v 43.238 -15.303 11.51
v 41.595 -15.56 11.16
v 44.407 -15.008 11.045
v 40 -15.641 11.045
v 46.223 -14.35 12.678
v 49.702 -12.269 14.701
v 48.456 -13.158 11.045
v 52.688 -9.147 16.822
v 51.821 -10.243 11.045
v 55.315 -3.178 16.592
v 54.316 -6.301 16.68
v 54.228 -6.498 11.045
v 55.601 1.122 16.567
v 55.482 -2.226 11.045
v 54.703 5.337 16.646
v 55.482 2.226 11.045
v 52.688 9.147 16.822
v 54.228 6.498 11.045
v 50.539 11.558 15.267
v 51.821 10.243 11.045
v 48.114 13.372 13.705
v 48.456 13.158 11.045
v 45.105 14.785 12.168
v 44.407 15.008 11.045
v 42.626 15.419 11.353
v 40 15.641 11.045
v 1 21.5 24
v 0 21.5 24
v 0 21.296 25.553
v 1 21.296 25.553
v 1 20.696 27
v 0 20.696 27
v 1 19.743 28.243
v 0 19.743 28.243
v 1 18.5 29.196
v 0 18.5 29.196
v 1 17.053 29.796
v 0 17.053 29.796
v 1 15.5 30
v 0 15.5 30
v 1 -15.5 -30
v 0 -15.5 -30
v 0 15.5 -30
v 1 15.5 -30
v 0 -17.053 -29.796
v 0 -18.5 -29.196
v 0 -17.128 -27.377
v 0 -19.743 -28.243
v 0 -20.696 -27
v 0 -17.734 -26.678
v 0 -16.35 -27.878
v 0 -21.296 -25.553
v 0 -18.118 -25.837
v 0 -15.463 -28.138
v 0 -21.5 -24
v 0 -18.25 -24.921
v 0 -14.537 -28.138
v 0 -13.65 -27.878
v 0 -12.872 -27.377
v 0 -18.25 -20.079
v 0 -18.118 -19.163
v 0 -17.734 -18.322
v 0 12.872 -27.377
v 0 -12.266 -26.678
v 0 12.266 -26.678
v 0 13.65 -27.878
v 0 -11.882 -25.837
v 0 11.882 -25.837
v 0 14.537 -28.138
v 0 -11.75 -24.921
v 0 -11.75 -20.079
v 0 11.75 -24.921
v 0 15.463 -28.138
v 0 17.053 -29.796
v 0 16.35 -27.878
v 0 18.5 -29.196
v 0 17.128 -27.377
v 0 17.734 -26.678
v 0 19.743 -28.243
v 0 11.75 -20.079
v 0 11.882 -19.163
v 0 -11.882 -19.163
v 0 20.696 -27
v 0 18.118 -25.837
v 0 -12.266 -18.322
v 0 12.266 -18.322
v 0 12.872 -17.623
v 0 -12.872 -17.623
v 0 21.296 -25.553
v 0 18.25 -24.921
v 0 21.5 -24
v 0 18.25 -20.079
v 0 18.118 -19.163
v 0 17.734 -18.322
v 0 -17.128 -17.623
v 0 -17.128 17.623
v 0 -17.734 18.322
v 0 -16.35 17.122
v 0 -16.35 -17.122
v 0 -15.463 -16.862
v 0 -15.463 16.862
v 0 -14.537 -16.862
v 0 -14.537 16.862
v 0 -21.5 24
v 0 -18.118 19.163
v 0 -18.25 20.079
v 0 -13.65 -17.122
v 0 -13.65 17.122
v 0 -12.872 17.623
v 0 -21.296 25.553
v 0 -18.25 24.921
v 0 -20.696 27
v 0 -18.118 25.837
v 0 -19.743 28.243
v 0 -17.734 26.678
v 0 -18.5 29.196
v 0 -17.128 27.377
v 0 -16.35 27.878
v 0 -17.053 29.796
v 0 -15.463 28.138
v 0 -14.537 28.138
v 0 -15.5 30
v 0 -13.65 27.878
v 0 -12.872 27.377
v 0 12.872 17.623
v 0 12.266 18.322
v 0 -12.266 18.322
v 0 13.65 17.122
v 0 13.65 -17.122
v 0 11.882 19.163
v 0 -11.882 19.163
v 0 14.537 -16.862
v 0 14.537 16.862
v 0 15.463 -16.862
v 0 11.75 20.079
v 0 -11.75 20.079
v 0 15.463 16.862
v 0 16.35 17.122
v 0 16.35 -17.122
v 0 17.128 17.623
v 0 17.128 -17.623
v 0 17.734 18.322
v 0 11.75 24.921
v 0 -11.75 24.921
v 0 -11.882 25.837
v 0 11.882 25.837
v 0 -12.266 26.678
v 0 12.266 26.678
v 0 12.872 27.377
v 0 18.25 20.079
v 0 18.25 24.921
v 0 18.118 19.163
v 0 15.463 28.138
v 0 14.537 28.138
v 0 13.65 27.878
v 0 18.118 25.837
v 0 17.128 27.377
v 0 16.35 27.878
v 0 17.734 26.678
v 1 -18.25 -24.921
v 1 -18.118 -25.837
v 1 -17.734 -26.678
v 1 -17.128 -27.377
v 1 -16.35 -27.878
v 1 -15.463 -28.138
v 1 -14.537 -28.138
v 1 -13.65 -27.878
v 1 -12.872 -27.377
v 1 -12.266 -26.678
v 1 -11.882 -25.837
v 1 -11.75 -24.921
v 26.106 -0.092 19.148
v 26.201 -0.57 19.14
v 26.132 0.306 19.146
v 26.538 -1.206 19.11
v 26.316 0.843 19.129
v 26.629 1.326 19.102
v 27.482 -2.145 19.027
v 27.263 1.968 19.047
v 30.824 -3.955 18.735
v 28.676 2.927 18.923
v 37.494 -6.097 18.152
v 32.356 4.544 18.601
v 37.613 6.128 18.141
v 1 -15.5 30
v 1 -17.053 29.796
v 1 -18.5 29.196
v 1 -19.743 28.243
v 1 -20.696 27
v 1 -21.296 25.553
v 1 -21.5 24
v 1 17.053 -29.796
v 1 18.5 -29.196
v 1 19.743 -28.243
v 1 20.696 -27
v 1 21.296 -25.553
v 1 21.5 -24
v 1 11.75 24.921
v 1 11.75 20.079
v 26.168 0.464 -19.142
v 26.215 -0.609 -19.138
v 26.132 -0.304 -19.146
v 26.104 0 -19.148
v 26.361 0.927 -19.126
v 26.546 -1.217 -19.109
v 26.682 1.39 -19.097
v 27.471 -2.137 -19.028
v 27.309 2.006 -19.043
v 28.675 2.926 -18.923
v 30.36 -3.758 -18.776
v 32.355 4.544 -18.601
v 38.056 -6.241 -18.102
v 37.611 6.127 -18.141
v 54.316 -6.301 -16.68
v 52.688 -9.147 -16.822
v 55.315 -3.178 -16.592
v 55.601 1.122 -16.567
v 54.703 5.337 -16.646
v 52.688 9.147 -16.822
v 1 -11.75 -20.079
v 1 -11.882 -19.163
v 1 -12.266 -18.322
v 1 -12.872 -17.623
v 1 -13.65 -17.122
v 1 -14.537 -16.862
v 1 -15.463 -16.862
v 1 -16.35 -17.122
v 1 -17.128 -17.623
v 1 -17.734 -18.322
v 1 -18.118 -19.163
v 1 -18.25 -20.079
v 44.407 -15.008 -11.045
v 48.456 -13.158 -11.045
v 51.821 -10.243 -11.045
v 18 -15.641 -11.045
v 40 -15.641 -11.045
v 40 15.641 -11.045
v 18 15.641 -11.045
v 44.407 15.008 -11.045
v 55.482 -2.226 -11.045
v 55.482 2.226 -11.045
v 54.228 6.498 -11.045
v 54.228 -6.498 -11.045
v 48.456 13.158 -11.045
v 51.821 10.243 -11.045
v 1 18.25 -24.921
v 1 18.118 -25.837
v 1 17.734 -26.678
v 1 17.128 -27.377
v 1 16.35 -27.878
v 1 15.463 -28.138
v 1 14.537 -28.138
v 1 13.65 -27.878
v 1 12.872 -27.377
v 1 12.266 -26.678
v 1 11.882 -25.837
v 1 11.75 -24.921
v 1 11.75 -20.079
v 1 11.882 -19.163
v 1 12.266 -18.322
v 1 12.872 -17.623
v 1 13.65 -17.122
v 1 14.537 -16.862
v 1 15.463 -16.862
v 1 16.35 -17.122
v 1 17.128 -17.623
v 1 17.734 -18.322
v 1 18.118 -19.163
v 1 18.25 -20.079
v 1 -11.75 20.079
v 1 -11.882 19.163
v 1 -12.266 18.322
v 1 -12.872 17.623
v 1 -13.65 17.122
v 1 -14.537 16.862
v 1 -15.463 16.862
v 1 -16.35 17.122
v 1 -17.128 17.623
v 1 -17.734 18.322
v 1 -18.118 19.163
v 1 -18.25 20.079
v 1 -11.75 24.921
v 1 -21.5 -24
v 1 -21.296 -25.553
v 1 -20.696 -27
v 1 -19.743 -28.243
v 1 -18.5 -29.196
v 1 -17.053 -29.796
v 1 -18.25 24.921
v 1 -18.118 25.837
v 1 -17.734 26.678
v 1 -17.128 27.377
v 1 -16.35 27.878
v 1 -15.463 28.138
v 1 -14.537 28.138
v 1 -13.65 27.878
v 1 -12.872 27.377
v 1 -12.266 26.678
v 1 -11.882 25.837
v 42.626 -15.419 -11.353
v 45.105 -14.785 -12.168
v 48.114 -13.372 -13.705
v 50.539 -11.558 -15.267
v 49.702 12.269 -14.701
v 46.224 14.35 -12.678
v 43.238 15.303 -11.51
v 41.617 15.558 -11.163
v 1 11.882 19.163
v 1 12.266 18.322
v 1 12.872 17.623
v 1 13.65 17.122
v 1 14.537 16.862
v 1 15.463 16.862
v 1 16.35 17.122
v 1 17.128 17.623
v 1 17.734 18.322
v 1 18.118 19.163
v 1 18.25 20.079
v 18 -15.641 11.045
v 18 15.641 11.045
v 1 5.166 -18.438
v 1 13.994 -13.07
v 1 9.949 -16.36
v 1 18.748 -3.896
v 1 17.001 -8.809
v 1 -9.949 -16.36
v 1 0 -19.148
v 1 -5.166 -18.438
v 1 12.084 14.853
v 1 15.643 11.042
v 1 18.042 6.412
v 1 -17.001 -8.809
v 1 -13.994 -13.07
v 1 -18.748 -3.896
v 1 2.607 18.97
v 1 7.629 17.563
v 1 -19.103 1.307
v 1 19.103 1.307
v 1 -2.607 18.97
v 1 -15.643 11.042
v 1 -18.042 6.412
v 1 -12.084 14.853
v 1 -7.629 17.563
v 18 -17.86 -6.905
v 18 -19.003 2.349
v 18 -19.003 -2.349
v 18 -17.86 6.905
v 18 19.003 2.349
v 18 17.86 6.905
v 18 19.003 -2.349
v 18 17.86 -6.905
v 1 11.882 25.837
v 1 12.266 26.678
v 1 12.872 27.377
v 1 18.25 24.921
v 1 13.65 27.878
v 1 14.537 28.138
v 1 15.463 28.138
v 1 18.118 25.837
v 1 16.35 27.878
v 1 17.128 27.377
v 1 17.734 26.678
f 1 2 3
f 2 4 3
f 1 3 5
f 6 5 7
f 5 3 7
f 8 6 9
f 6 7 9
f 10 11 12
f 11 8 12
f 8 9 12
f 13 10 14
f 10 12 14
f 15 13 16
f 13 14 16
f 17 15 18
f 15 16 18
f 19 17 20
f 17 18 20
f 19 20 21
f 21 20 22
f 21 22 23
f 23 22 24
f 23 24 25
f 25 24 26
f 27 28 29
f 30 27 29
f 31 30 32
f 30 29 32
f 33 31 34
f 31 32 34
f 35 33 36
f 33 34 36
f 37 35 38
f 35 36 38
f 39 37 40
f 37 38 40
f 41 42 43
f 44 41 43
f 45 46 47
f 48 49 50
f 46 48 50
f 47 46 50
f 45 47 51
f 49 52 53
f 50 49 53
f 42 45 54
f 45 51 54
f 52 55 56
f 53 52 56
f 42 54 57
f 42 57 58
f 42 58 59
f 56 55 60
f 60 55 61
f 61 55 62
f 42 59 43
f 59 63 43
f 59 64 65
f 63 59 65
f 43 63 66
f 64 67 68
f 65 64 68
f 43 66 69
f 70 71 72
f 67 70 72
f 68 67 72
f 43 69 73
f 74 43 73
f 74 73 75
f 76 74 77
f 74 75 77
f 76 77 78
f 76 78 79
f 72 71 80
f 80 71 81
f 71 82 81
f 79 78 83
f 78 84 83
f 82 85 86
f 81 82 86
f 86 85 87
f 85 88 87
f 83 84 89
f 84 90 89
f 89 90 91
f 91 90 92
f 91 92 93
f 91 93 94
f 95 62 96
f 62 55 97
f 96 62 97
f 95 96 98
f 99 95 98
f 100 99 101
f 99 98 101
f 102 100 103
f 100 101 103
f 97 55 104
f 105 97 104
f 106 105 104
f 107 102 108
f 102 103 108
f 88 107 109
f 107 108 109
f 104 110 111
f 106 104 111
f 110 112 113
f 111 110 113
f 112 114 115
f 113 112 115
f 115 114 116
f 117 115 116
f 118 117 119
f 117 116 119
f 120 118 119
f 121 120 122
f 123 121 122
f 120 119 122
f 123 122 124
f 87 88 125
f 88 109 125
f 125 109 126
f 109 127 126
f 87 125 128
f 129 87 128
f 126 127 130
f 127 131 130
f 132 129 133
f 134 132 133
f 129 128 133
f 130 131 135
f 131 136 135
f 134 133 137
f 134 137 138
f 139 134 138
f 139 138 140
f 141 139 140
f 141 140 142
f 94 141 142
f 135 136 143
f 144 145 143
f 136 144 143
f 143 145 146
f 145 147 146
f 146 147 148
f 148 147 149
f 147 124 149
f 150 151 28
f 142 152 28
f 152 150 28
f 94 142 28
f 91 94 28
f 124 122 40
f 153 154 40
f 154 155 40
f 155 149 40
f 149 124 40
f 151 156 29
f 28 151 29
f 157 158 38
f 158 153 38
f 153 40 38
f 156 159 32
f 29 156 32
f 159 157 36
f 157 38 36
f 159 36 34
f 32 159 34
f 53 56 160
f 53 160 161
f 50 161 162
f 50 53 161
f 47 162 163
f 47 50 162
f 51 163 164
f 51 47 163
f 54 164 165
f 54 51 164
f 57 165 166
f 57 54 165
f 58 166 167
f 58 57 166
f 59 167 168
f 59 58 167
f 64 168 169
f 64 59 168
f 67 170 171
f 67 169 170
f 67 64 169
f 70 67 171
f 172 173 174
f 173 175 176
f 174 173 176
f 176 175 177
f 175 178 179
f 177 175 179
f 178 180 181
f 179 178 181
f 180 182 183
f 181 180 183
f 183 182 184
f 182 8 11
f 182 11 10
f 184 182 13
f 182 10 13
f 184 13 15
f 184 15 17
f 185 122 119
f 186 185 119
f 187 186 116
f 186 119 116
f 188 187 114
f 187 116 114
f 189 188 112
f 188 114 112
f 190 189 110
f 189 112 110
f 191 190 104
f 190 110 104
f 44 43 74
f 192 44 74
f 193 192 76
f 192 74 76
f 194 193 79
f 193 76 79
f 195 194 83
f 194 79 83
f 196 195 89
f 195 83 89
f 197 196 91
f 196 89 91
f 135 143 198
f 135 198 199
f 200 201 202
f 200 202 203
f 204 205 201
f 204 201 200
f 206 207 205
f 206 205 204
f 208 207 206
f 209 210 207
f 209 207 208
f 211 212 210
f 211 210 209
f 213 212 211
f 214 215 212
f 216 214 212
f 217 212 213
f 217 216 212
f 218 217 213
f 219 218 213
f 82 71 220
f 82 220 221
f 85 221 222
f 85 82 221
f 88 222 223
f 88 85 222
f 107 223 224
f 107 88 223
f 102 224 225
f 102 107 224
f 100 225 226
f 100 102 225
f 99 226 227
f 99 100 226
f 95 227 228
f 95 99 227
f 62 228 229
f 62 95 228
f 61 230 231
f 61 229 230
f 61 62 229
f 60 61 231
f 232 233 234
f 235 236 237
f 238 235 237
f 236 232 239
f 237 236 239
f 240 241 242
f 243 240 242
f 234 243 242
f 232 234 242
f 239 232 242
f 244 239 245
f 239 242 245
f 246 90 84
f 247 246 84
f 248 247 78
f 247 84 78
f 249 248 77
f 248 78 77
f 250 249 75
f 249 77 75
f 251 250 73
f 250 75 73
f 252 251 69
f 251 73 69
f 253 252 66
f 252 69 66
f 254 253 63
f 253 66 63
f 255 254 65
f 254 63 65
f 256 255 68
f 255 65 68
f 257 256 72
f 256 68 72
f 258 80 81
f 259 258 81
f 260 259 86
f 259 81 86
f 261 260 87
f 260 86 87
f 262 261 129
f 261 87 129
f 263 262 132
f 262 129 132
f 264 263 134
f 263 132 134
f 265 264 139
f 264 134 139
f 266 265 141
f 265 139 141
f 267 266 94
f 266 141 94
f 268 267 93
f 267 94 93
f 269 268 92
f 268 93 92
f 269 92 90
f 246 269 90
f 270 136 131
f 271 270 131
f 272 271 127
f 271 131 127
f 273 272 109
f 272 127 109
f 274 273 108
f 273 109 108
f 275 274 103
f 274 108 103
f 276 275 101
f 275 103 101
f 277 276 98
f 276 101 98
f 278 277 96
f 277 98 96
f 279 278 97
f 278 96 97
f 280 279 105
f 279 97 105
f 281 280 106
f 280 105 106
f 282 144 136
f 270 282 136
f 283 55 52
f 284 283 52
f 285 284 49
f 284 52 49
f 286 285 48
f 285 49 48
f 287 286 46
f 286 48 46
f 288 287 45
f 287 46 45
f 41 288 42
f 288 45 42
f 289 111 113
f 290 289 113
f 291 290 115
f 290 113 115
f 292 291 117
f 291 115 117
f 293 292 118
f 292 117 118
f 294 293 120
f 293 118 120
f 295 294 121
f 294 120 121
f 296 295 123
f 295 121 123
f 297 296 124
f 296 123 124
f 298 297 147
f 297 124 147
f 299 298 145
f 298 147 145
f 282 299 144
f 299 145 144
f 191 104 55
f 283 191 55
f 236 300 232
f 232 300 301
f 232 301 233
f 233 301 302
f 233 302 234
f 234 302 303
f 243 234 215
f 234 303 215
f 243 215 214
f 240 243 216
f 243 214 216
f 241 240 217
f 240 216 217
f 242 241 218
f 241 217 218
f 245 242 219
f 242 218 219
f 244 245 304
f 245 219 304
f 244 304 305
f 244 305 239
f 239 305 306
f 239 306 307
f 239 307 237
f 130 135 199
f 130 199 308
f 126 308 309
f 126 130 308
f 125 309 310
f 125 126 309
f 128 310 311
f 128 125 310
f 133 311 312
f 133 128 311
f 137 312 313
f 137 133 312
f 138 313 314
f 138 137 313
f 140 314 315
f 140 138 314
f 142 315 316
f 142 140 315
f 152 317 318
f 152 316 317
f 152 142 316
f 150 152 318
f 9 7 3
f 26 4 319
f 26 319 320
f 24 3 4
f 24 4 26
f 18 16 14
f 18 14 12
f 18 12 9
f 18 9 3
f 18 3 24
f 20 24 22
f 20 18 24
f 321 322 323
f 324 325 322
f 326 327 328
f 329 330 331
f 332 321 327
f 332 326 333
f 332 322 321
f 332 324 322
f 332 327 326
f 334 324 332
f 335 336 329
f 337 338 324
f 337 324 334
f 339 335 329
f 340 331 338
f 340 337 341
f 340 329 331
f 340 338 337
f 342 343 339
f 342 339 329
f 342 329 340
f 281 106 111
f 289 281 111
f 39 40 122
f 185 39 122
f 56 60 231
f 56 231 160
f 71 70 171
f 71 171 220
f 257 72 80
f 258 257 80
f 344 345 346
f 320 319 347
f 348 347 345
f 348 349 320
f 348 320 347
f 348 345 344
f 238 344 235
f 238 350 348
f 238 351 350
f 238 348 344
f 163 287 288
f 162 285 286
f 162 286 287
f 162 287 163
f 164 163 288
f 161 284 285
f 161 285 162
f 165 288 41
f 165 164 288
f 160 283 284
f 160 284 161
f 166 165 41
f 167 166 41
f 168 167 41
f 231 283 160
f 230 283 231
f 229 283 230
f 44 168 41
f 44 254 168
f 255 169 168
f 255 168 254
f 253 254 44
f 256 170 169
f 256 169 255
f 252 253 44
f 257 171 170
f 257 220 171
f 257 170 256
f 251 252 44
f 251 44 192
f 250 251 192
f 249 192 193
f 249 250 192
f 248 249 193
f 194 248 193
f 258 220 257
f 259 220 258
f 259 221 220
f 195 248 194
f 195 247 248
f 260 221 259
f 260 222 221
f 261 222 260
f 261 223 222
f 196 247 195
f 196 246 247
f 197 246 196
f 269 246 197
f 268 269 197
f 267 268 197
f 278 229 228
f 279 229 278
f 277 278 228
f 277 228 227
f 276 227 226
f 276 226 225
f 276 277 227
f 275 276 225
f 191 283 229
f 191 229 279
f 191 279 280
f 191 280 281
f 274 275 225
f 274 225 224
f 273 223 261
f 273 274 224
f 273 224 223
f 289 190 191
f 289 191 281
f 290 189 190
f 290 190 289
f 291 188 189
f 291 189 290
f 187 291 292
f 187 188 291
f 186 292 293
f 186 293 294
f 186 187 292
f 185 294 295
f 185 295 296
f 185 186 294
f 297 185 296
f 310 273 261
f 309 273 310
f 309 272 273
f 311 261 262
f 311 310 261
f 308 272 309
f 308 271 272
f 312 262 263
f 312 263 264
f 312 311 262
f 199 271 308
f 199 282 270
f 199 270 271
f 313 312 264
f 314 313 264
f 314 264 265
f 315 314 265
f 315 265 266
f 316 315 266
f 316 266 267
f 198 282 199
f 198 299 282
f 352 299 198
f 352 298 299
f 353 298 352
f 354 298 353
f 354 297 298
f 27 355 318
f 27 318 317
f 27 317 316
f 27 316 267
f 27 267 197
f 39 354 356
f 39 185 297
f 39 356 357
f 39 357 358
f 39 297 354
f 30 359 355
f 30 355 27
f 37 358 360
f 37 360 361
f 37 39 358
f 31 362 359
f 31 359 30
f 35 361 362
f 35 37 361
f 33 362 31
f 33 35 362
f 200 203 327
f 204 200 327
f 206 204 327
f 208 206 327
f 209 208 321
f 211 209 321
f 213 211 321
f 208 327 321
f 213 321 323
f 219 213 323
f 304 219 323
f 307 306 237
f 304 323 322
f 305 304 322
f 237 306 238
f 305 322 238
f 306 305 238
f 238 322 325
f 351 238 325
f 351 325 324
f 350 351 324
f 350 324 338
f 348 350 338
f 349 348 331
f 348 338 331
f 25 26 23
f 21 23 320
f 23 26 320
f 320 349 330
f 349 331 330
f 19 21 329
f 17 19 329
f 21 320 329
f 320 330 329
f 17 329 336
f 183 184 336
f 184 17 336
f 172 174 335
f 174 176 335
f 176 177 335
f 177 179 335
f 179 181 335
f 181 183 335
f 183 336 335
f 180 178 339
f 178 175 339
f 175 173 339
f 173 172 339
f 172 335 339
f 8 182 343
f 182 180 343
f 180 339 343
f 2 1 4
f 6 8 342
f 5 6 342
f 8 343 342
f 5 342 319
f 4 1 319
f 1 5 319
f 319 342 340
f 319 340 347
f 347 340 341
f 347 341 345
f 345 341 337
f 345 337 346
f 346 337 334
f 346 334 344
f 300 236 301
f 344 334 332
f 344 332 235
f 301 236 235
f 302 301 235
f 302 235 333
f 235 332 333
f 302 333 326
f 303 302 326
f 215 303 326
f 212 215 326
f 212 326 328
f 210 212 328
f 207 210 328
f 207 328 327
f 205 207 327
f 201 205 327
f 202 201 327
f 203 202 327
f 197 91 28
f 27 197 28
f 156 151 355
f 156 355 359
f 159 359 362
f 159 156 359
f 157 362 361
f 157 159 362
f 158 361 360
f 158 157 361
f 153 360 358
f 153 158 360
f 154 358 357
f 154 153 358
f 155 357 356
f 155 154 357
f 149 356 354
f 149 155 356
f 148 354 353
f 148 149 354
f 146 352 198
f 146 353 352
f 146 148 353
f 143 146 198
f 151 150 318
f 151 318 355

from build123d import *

# Parameters (mm, degrees)
SKETCH_1_R                     = 1.5
EXTRUDE_1_DEPTH                = 1
SKETCH_2_R                     = 19.148010015
EXTRUDE_2_DEPTH                = 59
SKETCH_3_W                     = 18.03673264
SKETCH_3_H                     = 38.517695405
CUT_EXTRUDE_1_DEPTH            = 56
CUT_EXTRUDE_1_DRAFT            = -5
CUT_EXTRUDE_1_PROFILE_2_DEPTH  = 56
CUT_EXTRUDE_1_PROFILE_2_DRAFT  = -5
SKETCH_4_R                     = 20
EXTRUDE_3_DEPTH                = 10
SKETCH_5_W                     = 22.090311304
SKETCH_5_H                     = 43.24098638
CUT_EXTRUDE_2_DEPTH            = 42
CUT_EXTRUDE_3_DEPTH            = 71.443239562
CUT_EXTRUDE_3_DEPTH_BACK       = 71.443239562
SPLIT_BODIES_1_SURFACE_1_BACK  = 96.126
SPLIT_BODIES_1_SURFACE_1_DEPTH = 192.252
SPLIT_BODIES_1_SURFACE_2_BACK  = 96.126
SPLIT_BODIES_1_SURFACE_2_DEPTH = 192.252
MOVE_BODY_1_ANGLE              = 90
CUT_EXTRUDE_4_DEPTH            = 10


with BuildPart() as part:
    # 草图1 → 凸台-拉伸1 (new body)
    with BuildSketch(Plane(origin=(0, 0, 0), x_dir=(0, 0, -1), z_dir=(1, 0, 0))):
        with BuildLine():
            Line((-15.5, -30), (15.5, -30))
            ThreePointArc((15.5, -30), (19.742640687, -28.242640687), (21.5, -24))
            Line((21.5, -24), (21.5, 24))
            ThreePointArc((21.5, 24), (19.742640687, 28.242640687), (15.5, 30))
            Line((15.5, 30), (-15.5, 30))
            ThreePointArc((-15.5, 30), (-19.742640687, 28.242640687), (-21.5, 24))
            Line((-21.5, 24), (-21.5, -24))
            ThreePointArc((-21.5, -24), (-19.742640687, -28.242640687), (-15.5, -30))
        make_face()
        with Locations((15, 22.5)):
            Circle(SKETCH_1_R, mode=Mode.SUBTRACT)
        with Locations(Location((-15, 22.5, 0), (0, 0, 180))):
            Circle(SKETCH_1_R, mode=Mode.SUBTRACT)
        with Locations(Location((15, -22.5, 0), (0, 0, 180))):
            Circle(SKETCH_1_R, mode=Mode.SUBTRACT)
        with Locations((-15, -22.5)):
            Circle(SKETCH_1_R, mode=Mode.SUBTRACT)
    extrude(amount=EXTRUDE_1_DEPTH)

    # 草图2 → 凸台-拉伸2 (add)
    with BuildSketch(Plane(origin=(1, 0, 0), x_dir=(0, 0, -1), z_dir=(1, 0, 0))):
        Circle(SKETCH_2_R)
    extrude(amount=EXTRUDE_2_DEPTH)


with BuildPart() as cut_extrude_1_tool:
    # 草图3 → 切除-拉伸1 (with draft: the straight prism first)
    with BuildSketch(Plane(origin=(60, 0, 0), x_dir=(0, 0, -1), z_dir=(1, 0, 0))):
        with Locations((-25.200855418, 1.306398859)):
            Rectangle(SKETCH_3_W, SKETCH_3_H)
    extrude(amount=-CUT_EXTRUDE_1_DEPTH)
    # 切除-拉伸1: the draft: its side faces are tilted about the plane it starts from
    cut_extrude_1_sides = [cut_extrude_1_tool.faces().sort_by_distance(p)[0] for p in [
        (32, 1.306398859, 34.219221738),
        (32, -17.952448843, 25.200855418),
        (32, 1.306398859, 16.182489098),
        (32, 20.565246562, 25.200855418),
    ]]
    draft(cut_extrude_1_sides, Plane(origin=(60, 0, 0), x_dir=(0, 0, -1), z_dir=(1, 0, 0)), CUT_EXTRUDE_1_DRAFT)


with BuildPart() as part_1:
    add(part.part)

    # 切除-拉伸1: cut by cut_extrude_1_tool
    add(cut_extrude_1_tool.part, mode=Mode.SUBTRACT)


with BuildPart() as cut_extrude_1_profile_2_tool:
    # 草图3 → 切除-拉伸1 profile 2 (with draft: the straight prism first)
    with BuildSketch(Plane(origin=(60, 0, 0), x_dir=(0, 0, -1), z_dir=(1, 0, 0))):
        with Locations((25.200855418, 1.306398859)):
            Rectangle(SKETCH_3_W, SKETCH_3_H)
    extrude(amount=-CUT_EXTRUDE_1_PROFILE_2_DEPTH)
    # 切除-拉伸1 profile 2: the draft: its side faces are tilted about the plane it starts from
    cut_extrude_1_profile_2_sides = [cut_extrude_1_profile_2_tool.faces().sort_by_distance(p)[0] for p in [
        (32, 1.306398859, -16.182489098),
        (32, -17.952448843, -25.200855418),
        (32, 1.306398859, -34.219221738),
        (32, 20.565246562, -25.200855418),
    ]]
    draft(cut_extrude_1_profile_2_sides, Plane(origin=(60, 0, 0), x_dir=(0, 0, -1), z_dir=(1, 0, 0)), CUT_EXTRUDE_1_PROFILE_2_DRAFT)


with BuildPart() as part_2:
    add(part_1.part)

    # 切除-拉伸1 profile 2: cut by cut_extrude_1_profile_2_tool
    add(cut_extrude_1_profile_2_tool.part, mode=Mode.SUBTRACT)

    # 草图5 → 切除-拉伸2 (cut)
    with BuildSketch(Plane(origin=(60, 0, 0), x_dir=(0, 0, -1), z_dir=(1, 0, 0))):
        Rectangle(SKETCH_5_W, SKETCH_5_H)
    extrude(amount=-CUT_EXTRUDE_2_DEPTH, mode=Mode.SUBTRACT)

    # 草图6 → 切除-拉伸3 (cut, two sides: drawn at the far end of the back side and taken through both)
    with BuildSketch(Plane.XY.offset(-CUT_EXTRUDE_3_DEPTH_BACK)):
        with BuildLine():
            Line((40, 15.641317852), (60, 15.641317852))
            Line((60, 15.641317852), (60, -15.641317852))
            Line((60, -15.641317852), (40, -15.641317852))
            ThreePointArc((40, -15.641317852), (55.641317852, 0), (40, 15.641317852))
        make_face()
    extrude(amount=CUT_EXTRUDE_3_DEPTH + CUT_EXTRUDE_3_DEPTH_BACK, mode=Mode.SUBTRACT)


with BuildPart() as body_2:
    # 草图4 → 凸台-拉伸3 (new, symmetric)
    with BuildSketch(Plane.XY):
        with Locations((40, 0)):
            Circle(SKETCH_4_R)
    extrude(amount=EXTRUDE_3_DEPTH, both=True)


with BuildPart() as body_3:
    # Split Bodies 1: the piece behind the surface
    add(part_2.part)
    # Split Bodies 1 surface: a surface, the sketch's curves swept straight by 192.252 mm
    with BuildLine(Plane(origin=(0, 0, -21.5), x_dir=(-1, 0, 0), z_dir=(0, 0, -1)).offset(-SPLIT_BODIES_1_SURFACE_1_BACK), mode=Mode.PRIVATE) as split_bodies_1_surface_1_path:
        Line((-1, 32.867320156), (-1, -33.990989222))
    split_bodies_1_surface_1 = Shell.extrude(split_bodies_1_surface_1_path.wire(), (0 * SPLIT_BODIES_1_SURFACE_1_DEPTH, 0 * SPLIT_BODIES_1_SURFACE_1_DEPTH, -1 * SPLIT_BODIES_1_SURFACE_1_DEPTH))
    split(bisect_by=split_bodies_1_surface_1, keep=Keep.BOTTOM)


with BuildPart() as part_3:
    add(part_2.part)

    # Split Bodies 1: split by a surface, the side it looks to stays
    # Split Bodies 1 surface: a surface, the sketch's curves swept straight by 192.252 mm
    with BuildLine(Plane(origin=(0, 0, -21.5), x_dir=(-1, 0, 0), z_dir=(0, 0, -1)).offset(-SPLIT_BODIES_1_SURFACE_2_BACK), mode=Mode.PRIVATE) as split_bodies_1_surface_2_path:
        Line((-1, 32.867320156), (-1, -33.990989222))
    split_bodies_1_surface_2 = Shell.extrude(split_bodies_1_surface_2_path.wire(), (0 * SPLIT_BODIES_1_SURFACE_2_DEPTH, 0 * SPLIT_BODIES_1_SURFACE_2_DEPTH, -1 * SPLIT_BODIES_1_SURFACE_2_DEPTH))
    split(bisect_by=split_bodies_1_surface_2, keep=Keep.TOP)


with BuildPart() as part_4:
    # Move Body 1: moved
    add(part_3.part.rotate(Axis((0, 0, 0), (1, 0, 0)), MOVE_BODY_1_ANGLE))

    # 草图8 → 切除-拉伸4 (cut)
    with BuildSketch(Plane.ZY):
        with BuildLine():
            Line((20.07870017, 18.25), (24.92129983, 18.25))
            ThreePointArc((24.92129983, 18.25), (28.17129983, 15), (24.92129983, 11.75))
            Line((24.92129983, 11.75), (20.07870017, 11.75))
            ThreePointArc((20.07870017, 11.75), (16.82870017, 15), (20.07870017, 18.25))
        make_face()
        with BuildLine():
            Line((20.07870017, -18.25), (24.92129983, -18.25))
            ThreePointArc((24.92129983, -18.25), (28.17129983, -15), (24.92129983, -11.75))
            Line((24.92129983, -11.75), (20.07870017, -11.75))
            ThreePointArc((20.07870017, -11.75), (16.82870017, -15), (20.07870017, -18.25))
        make_face()
        with BuildLine():
            Line((-20.07870017, -18.25), (-24.92129983, -18.25))
            ThreePointArc((-24.92129983, -18.25), (-28.17129983, -15), (-24.92129983, -11.75))
            Line((-24.92129983, -11.75), (-20.07870017, -11.75))
            ThreePointArc((-20.07870017, -11.75), (-16.82870017, -15), (-20.07870017, -18.25))
        make_face()
        with BuildLine():
            Line((-20.07870017, 18.25), (-24.92129983, 18.25))
            ThreePointArc((-24.92129983, 18.25), (-28.17129983, 15), (-24.92129983, 11.75))
            Line((-24.92129983, 11.75), (-20.07870017, 11.75))
            ThreePointArc((-20.07870017, 11.75), (-16.82870017, 15), (-20.07870017, 18.25))
        make_face()
    extrude(amount=-CUT_EXTRUDE_4_DEPTH, mode=Mode.SUBTRACT)


solid = Compound([body_3.part, part_4.part])
